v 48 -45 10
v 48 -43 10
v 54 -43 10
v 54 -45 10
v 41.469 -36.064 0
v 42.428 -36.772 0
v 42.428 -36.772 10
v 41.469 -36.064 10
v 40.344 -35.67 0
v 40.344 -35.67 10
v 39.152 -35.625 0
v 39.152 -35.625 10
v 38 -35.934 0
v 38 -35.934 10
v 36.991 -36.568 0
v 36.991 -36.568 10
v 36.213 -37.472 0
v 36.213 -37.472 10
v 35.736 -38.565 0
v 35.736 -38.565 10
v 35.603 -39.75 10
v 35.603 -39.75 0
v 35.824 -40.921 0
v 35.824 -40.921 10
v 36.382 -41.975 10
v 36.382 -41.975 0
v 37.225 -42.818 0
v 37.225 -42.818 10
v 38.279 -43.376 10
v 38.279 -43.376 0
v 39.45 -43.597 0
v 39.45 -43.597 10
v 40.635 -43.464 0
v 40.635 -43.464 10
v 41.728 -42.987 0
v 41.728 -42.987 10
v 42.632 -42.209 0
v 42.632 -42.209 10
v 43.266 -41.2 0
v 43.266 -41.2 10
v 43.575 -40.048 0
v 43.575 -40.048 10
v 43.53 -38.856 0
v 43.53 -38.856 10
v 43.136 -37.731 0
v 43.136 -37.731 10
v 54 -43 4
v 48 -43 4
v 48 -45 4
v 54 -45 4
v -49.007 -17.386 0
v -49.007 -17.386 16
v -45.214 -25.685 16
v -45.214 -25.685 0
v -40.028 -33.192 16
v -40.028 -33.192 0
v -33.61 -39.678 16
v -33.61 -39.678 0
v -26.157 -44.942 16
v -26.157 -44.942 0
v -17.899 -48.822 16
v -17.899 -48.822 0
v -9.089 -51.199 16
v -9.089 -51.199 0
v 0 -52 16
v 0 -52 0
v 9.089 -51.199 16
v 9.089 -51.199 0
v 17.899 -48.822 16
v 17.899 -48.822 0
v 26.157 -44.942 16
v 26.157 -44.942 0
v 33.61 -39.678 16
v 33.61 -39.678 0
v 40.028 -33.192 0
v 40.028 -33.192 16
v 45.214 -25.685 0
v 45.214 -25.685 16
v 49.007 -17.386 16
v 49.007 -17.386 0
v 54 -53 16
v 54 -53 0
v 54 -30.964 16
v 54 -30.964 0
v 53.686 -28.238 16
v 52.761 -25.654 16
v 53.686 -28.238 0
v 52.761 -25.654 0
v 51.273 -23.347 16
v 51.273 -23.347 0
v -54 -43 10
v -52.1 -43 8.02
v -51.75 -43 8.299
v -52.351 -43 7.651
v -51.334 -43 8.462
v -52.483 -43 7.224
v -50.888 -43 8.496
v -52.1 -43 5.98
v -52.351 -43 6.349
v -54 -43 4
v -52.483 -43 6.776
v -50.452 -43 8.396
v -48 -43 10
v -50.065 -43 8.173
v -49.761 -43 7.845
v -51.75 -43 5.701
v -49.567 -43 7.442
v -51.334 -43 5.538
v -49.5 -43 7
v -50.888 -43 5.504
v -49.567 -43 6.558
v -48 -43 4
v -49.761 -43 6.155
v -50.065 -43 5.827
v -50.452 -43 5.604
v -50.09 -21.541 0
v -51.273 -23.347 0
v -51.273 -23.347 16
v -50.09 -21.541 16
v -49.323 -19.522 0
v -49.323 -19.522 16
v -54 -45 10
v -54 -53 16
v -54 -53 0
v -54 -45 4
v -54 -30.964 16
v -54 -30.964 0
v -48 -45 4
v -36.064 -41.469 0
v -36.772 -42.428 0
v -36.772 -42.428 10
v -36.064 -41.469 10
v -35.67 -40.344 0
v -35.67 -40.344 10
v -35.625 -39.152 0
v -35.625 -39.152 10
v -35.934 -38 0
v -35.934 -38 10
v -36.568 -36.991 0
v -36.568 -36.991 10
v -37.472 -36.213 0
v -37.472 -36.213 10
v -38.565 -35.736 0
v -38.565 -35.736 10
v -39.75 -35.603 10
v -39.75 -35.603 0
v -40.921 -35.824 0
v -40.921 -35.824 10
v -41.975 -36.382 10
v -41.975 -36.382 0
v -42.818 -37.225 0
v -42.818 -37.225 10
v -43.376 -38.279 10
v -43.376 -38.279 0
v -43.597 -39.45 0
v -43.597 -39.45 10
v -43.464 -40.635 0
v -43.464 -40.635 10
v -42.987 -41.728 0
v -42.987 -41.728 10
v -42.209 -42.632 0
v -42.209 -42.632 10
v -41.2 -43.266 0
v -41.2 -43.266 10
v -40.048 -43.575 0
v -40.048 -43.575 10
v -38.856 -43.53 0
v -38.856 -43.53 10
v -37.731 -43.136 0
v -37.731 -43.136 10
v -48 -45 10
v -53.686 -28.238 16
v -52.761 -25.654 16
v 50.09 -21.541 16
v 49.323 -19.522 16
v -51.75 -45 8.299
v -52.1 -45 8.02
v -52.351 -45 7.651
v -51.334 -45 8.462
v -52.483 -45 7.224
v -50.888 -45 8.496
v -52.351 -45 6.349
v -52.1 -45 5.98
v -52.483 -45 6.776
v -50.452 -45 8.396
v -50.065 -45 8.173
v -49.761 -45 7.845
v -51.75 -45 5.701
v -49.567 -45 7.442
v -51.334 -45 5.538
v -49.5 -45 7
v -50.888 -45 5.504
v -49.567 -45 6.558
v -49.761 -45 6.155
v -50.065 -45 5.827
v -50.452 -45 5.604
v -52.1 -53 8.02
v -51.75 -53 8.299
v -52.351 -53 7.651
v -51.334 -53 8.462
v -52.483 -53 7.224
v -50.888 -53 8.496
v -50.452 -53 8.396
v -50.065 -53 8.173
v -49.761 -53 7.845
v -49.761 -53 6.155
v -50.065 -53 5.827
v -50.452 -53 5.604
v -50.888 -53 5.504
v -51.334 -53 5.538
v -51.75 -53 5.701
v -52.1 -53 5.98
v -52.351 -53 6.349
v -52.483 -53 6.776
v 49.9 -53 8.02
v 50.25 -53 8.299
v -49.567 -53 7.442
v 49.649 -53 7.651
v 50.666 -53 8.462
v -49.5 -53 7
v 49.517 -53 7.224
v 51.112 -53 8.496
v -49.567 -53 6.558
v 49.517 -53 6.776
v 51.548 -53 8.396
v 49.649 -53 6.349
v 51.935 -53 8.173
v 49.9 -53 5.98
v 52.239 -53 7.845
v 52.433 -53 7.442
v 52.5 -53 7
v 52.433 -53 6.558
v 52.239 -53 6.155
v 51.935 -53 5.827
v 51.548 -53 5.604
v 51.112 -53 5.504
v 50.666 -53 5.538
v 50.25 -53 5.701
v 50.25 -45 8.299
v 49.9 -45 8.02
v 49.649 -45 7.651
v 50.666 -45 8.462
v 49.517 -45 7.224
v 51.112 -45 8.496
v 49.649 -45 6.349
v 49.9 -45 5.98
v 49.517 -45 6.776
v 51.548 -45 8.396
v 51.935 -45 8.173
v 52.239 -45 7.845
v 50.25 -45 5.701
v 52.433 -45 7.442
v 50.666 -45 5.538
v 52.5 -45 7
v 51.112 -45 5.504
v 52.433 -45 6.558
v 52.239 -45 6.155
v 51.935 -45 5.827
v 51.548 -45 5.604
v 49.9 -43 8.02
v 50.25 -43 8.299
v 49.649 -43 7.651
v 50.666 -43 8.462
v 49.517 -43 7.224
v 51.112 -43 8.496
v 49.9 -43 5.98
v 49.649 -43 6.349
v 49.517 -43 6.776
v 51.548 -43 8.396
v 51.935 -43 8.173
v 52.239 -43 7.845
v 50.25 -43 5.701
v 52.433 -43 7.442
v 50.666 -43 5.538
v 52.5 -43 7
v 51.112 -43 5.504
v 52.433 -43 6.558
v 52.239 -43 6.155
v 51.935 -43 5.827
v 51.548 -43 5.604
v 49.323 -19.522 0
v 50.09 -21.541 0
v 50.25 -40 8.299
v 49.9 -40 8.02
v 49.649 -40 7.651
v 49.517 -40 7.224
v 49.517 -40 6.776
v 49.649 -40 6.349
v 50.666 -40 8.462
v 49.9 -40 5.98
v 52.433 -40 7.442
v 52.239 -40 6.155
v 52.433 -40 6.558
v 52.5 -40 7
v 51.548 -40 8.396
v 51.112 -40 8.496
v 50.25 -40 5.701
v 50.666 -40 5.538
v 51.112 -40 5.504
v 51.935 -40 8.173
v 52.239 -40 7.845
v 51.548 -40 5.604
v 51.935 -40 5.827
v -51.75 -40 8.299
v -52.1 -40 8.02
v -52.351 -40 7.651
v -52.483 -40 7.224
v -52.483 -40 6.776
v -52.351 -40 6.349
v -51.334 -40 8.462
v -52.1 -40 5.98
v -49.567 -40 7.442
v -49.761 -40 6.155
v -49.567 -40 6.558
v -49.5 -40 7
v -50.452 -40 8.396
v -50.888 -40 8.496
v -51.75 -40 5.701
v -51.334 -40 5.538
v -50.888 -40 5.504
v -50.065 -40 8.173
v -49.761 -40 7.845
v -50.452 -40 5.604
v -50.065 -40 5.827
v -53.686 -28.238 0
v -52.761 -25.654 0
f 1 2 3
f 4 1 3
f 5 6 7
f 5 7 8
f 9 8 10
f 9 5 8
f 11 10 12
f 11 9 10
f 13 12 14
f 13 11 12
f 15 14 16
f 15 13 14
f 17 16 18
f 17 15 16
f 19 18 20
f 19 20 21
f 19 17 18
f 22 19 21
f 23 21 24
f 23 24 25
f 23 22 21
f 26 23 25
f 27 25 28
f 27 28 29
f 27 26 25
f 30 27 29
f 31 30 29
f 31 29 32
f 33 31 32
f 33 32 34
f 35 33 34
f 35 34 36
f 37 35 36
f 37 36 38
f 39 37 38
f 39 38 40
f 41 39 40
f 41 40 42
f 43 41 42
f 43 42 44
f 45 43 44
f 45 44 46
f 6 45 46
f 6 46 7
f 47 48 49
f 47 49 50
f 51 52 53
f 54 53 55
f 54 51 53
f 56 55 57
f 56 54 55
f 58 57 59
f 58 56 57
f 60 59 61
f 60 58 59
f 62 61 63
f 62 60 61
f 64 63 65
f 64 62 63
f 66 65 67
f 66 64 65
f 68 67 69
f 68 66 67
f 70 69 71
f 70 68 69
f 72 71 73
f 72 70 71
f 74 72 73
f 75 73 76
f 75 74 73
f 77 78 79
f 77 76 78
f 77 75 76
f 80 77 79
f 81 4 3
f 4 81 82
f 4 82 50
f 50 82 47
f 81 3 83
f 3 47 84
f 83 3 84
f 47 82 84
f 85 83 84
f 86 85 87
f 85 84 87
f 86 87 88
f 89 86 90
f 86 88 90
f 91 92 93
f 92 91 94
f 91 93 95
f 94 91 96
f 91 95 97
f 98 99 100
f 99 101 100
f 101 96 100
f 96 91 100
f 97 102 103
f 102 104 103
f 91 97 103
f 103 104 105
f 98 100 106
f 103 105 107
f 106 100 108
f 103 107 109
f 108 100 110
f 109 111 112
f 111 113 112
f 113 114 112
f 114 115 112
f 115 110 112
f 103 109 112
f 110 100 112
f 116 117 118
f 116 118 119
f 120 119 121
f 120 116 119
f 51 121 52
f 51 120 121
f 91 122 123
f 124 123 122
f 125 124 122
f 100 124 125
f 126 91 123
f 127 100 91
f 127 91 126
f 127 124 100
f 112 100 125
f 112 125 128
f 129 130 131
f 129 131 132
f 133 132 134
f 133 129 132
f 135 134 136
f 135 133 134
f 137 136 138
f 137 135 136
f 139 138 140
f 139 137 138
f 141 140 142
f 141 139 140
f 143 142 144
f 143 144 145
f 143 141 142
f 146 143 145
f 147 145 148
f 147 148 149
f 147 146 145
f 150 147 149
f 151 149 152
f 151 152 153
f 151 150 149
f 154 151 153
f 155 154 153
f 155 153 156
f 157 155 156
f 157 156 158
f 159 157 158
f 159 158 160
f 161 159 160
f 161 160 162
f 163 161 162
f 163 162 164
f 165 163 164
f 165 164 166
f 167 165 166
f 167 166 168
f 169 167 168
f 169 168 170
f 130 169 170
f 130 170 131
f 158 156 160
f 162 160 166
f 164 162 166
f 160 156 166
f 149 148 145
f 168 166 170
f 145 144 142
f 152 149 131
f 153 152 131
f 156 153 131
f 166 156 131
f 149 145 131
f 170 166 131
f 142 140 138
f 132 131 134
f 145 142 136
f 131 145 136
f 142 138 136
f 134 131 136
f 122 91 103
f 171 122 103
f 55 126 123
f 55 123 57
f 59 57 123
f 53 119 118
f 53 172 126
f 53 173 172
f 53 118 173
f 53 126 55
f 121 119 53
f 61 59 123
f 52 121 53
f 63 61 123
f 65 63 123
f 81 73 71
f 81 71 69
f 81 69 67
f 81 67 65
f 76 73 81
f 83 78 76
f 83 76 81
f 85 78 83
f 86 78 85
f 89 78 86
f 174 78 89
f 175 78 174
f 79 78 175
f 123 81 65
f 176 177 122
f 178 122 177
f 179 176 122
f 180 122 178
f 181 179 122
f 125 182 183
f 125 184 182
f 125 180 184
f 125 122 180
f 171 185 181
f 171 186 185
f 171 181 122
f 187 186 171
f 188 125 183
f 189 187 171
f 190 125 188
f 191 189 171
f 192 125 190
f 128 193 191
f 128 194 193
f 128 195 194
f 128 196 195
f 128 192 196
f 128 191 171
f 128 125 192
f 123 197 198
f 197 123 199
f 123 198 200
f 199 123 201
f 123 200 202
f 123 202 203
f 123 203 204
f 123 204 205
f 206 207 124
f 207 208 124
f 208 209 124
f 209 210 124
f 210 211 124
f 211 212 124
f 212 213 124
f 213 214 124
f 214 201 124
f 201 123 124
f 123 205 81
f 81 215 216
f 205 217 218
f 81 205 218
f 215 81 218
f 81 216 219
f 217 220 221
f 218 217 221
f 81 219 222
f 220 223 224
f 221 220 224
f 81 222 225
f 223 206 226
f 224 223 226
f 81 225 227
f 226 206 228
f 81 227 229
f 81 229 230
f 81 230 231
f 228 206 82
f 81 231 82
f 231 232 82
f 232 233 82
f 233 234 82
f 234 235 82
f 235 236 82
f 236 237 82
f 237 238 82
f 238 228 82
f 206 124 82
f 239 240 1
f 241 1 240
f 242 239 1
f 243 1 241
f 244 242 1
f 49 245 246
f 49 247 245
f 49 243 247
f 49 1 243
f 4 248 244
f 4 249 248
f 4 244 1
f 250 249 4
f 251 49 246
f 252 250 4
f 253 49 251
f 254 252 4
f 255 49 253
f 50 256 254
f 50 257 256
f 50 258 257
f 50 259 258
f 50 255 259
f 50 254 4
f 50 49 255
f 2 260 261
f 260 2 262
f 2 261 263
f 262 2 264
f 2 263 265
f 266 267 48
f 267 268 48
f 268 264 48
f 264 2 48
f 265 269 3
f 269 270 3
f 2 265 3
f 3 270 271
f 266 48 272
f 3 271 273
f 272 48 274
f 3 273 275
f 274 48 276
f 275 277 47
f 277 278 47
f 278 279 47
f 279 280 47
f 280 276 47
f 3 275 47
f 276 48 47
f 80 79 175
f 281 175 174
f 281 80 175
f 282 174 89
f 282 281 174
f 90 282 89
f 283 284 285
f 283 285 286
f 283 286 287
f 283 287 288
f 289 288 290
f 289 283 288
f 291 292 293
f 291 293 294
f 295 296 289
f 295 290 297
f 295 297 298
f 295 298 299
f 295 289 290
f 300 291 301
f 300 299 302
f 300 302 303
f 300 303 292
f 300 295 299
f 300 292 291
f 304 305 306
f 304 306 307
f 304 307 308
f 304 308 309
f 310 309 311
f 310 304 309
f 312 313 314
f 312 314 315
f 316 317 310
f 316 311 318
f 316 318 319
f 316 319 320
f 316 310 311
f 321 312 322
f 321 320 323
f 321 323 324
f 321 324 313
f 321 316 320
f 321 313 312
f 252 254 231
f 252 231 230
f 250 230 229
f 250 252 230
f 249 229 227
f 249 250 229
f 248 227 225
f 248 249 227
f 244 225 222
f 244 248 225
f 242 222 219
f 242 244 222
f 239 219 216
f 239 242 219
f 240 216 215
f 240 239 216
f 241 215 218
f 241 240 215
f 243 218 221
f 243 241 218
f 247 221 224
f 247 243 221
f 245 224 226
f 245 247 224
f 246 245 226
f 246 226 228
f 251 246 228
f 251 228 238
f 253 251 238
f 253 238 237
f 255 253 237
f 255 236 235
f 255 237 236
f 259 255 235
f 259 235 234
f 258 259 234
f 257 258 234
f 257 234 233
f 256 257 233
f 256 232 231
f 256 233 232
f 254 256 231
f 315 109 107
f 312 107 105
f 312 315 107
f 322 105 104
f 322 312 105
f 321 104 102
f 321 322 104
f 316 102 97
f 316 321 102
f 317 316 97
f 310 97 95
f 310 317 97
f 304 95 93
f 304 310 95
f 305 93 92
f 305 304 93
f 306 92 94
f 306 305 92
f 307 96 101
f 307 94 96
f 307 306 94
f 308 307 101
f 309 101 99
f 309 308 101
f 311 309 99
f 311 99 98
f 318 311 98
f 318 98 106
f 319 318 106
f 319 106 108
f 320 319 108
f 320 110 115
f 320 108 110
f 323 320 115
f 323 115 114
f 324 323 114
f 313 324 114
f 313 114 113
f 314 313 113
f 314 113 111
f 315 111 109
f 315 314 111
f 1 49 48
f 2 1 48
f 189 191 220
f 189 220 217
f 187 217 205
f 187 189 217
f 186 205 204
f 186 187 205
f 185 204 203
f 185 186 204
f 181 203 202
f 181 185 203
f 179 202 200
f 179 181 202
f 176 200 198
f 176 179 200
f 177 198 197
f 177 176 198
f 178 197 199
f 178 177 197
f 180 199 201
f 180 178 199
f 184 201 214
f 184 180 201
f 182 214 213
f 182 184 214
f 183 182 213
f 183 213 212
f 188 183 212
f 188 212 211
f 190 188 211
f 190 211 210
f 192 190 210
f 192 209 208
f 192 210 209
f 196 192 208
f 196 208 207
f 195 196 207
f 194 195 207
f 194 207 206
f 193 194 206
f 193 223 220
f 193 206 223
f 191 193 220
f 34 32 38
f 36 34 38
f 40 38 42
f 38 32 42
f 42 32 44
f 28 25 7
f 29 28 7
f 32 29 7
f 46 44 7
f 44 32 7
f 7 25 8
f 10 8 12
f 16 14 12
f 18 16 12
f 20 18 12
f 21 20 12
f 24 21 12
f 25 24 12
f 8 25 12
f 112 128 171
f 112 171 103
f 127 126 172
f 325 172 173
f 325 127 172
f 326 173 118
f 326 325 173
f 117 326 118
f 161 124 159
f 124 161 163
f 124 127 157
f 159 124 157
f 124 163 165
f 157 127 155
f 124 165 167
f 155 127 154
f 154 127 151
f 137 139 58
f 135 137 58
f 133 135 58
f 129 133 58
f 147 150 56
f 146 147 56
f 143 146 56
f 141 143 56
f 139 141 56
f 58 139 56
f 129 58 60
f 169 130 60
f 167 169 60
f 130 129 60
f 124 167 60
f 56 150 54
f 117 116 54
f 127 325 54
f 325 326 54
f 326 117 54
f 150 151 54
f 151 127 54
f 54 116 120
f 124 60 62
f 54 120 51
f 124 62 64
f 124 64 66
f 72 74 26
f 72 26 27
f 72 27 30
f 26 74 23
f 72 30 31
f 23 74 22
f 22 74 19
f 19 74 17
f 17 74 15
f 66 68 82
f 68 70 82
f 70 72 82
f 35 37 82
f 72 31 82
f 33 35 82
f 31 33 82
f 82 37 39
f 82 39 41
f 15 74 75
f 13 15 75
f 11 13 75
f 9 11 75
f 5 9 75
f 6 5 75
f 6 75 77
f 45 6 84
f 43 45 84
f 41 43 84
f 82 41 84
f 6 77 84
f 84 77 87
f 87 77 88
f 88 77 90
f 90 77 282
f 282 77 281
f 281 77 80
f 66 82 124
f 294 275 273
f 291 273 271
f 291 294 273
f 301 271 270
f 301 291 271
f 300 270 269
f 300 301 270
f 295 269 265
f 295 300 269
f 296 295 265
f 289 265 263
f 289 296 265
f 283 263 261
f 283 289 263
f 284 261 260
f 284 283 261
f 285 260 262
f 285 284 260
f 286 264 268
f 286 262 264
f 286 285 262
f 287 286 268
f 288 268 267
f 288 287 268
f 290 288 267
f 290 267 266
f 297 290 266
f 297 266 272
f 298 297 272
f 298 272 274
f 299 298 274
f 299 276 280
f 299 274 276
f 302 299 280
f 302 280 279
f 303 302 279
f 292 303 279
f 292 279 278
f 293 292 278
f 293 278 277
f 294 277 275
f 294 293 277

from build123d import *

# Parameters (mm, degrees)
CYLINDER1036_R               = 1.5
CYLINDER1036_DEPTH           = 20
CYLINDER1034_R               = 1.5
CYLINDER1034_DEPTH           = 20
CYLINDER1031_R               = 1.5
CYLINDER1031_DEPTH           = 20
CYLINDER1035_R               = 1.5
CYLINDER1035_DEPTH           = 20
BOX431_W                     = 6
BOX431_H                     = 2
BOX431_DEPTH                 = 6
BOX432_W                     = 6
BOX432_H                     = 2
BOX432_DEPTH                 = 6
BOX430_W                     = 6
BOX430_H                     = 2
BOX430_DEPTH                 = 6
BOX429_W                     = 6
BOX429_H                     = 2
BOX429_DEPTH                 = 6
CYLINDER1038_R               = 4
CYLINDER1038_DEPTH           = 20
CYLINDER1038_PLACEMENT_ANGLE = 45
CYLINDER1037_R               = 4
CYLINDER1037_DEPTH           = 20
CYLINDER1037_PLACEMENT_ANGLE = 45
CYLINDER1032_R               = 10
CYLINDER1032_DEPTH           = 40
CYLINDER1039_R               = 10
CYLINDER1039_DEPTH           = 40
CYLINDER1033_R               = 52
CYLINDER1033_DEPTH           = 20
BOX433_W                     = 108
BOX433_H                     = 36
BOX433_DEPTH                 = 16
FILLET_R                     = 12


with BuildPart() as v_lec1036:
    # Cylinder1036 → Cylinder1036 (new body)
    with BuildSketch(Plane(origin=(20, -40, -5), x_dir=(1, 0, 0), z_dir=(0, -1, 0))):
        Circle(CYLINDER1036_R)
    extrude(amount=CYLINDER1036_DEPTH)


with BuildPart() as v_lec1034:
    # Cylinder1034 → Cylinder1034 (new body)
    with BuildSketch(Plane(origin=(51, -40, 7), x_dir=(1, 0, 0), z_dir=(0, -1, 0))):
        Circle(CYLINDER1034_R)
    extrude(amount=CYLINDER1034_DEPTH)


with BuildPart() as v_lec1031:
    # Cylinder1031 → Cylinder1031 (new body)
    with BuildSketch(Plane(origin=(-51, -40, 7), x_dir=(1, 0, 0), z_dir=(0, -1, 0))):
        Circle(CYLINDER1031_R)
    extrude(amount=CYLINDER1031_DEPTH)


with BuildPart() as compound823:
    # Cylinder1035 → Cylinder1035 (new body)
    with BuildSketch(Plane(origin=(-20, -40, -5), x_dir=(1, 0, 0), z_dir=(0, -1, 0))):
        Circle(CYLINDER1035_R)
    extrude(amount=CYLINDER1035_DEPTH)

    # Compound823: union Válec1036, Válec1034, Válec1031
    add(v_lec1036.part)
    add(v_lec1034.part)
    add(v_lec1031.part)


with BuildPart() as krychle431:
    # Box431 → Box431 (new body)
    with BuildSketch(Plane(origin=(17, -47, -8), x_dir=(1, 0, 0), z_dir=(0, 0, 1))):
        with Locations((3, 1)):
            Rectangle(BOX431_W, BOX431_H)
    extrude(amount=BOX431_DEPTH)


with BuildPart() as krychle432:
    # Box432 → Box432 (new body)
    with BuildSketch(Plane(origin=(48, -45, 4), x_dir=(1, 0, 0), z_dir=(0, 0, 1))):
        with Locations((3, 1)):
            Rectangle(BOX432_W, BOX432_H)
    extrude(amount=BOX432_DEPTH)


with BuildPart() as krychle430:
    # Box430 → Box430 (new body)
    with BuildSketch(Plane(origin=(-54, -45, 4), x_dir=(1, 0, 0), z_dir=(0, 0, 1))):
        with Locations((3, 1)):
            Rectangle(BOX430_W, BOX430_H)
    extrude(amount=BOX430_DEPTH)


with BuildPart() as compound824:
    # Box429 → Box429 (new body)
    with BuildSketch(Plane(origin=(-23, -47, -8), x_dir=(1, 0, 0), z_dir=(0, 0, 1))):
        with Locations((3, 1)):
            Rectangle(BOX429_W, BOX429_H)
    extrude(amount=BOX429_DEPTH)

    # Compound824: union Krychle431, Krychle432, Krychle430
    add(krychle431.part)
    add(krychle432.part)
    add(krychle430.part)


with BuildPart() as v_lec1038:
    # Cylinder1038 → Cylinder1038 (new body)
    with BuildSketch(Plane.XY):
        Circle(CYLINDER1038_R)
    extrude(amount=CYLINDER1038_DEPTH)


with BuildPart() as v_lec1038_1:
    # Cylinder1038 placement: moved
    add(v_lec1038.part.moved(Location((39.6, -39.6, -10))).rotate(Axis((39.6, -39.6, -10), (0, 0, 1)), CYLINDER1038_PLACEMENT_ANGLE))


with BuildPart() as compound822:
    # Cylinder1037 → Cylinder1037 (new body)
    with BuildSketch(Plane.XY):
        Circle(CYLINDER1037_R)
    extrude(amount=CYLINDER1037_DEPTH)


with BuildPart() as compound822_1:
    # Cylinder1037 placement: moved
    add(compound822.part.moved(Location((-39.6, -39.6, -10))).rotate(Axis((-39.6, -39.6, -10), (0, 0, -1)), CYLINDER1037_PLACEMENT_ANGLE))

    # Compound822: union Válec1038
    add(v_lec1038_1.part)


with BuildPart() as v_lec1032:
    # Cylinder1032 → Cylinder1032 (new body)
    with BuildSketch(Plane(origin=(-59, -17, 0), x_dir=(1, 0, 0), z_dir=(0, 0, 1))):
        Circle(CYLINDER1032_R)
    extrude(amount=CYLINDER1032_DEPTH)


with BuildPart() as compound825:
    # Cylinder1039 → Cylinder1039 (new body)
    with BuildSketch(Plane(origin=(59, -17, 0), x_dir=(1, 0, 0), z_dir=(0, 0, 1))):
        Circle(CYLINDER1039_R)
    extrude(amount=CYLINDER1039_DEPTH)

    # Compound825: union Válec1032
    add(v_lec1032.part)


with BuildPart() as v_lec1033:
    # Cylinder1033 → Cylinder1033 (new body)
    with BuildSketch(Plane.XY.offset(20)):
        Circle(CYLINDER1033_R)
    extrude(amount=CYLINDER1033_DEPTH)


with BuildPart() as fillet_body:
    # Box433 → Box433 (new body)
    with BuildSketch(Plane(origin=(-54, -53, 20), x_dir=(1, 0, 0), z_dir=(0, 0, 1))):
        with Locations((54, 18)):
            Rectangle(BOX433_W, BOX433_H)
    extrude(amount=BOX433_DEPTH)

    # Cut432: cut Válec1033
    add(v_lec1033.part, mode=Mode.SUBTRACT)


with BuildPart() as fillet_body_1:
    # Cut432 placement: moved
    add(fillet_body.part.moved(Location((0, 0, -20))))

    # Cut433: cut Compound825
    add(compound825.part, mode=Mode.SUBTRACT)

    # Cut431: cut Compound822
    add(compound822_1.part, mode=Mode.SUBTRACT)

    # Cut430: cut Compound824
    add(compound824.part, mode=Mode.SUBTRACT)

    # Cut429: cut Compound823
    add(compound823.part, mode=Mode.SUBTRACT)

    # Fillet
    fillet_edges = [fillet_body_1.edges().sort_by_distance(p)[0] for p in [
        (-54, -25.660254, 8),
        (54, -25.660254, 8),
    ]]
    fillet(fillet_edges, radius=FILLET_R)


solid = fillet_body_1.part
